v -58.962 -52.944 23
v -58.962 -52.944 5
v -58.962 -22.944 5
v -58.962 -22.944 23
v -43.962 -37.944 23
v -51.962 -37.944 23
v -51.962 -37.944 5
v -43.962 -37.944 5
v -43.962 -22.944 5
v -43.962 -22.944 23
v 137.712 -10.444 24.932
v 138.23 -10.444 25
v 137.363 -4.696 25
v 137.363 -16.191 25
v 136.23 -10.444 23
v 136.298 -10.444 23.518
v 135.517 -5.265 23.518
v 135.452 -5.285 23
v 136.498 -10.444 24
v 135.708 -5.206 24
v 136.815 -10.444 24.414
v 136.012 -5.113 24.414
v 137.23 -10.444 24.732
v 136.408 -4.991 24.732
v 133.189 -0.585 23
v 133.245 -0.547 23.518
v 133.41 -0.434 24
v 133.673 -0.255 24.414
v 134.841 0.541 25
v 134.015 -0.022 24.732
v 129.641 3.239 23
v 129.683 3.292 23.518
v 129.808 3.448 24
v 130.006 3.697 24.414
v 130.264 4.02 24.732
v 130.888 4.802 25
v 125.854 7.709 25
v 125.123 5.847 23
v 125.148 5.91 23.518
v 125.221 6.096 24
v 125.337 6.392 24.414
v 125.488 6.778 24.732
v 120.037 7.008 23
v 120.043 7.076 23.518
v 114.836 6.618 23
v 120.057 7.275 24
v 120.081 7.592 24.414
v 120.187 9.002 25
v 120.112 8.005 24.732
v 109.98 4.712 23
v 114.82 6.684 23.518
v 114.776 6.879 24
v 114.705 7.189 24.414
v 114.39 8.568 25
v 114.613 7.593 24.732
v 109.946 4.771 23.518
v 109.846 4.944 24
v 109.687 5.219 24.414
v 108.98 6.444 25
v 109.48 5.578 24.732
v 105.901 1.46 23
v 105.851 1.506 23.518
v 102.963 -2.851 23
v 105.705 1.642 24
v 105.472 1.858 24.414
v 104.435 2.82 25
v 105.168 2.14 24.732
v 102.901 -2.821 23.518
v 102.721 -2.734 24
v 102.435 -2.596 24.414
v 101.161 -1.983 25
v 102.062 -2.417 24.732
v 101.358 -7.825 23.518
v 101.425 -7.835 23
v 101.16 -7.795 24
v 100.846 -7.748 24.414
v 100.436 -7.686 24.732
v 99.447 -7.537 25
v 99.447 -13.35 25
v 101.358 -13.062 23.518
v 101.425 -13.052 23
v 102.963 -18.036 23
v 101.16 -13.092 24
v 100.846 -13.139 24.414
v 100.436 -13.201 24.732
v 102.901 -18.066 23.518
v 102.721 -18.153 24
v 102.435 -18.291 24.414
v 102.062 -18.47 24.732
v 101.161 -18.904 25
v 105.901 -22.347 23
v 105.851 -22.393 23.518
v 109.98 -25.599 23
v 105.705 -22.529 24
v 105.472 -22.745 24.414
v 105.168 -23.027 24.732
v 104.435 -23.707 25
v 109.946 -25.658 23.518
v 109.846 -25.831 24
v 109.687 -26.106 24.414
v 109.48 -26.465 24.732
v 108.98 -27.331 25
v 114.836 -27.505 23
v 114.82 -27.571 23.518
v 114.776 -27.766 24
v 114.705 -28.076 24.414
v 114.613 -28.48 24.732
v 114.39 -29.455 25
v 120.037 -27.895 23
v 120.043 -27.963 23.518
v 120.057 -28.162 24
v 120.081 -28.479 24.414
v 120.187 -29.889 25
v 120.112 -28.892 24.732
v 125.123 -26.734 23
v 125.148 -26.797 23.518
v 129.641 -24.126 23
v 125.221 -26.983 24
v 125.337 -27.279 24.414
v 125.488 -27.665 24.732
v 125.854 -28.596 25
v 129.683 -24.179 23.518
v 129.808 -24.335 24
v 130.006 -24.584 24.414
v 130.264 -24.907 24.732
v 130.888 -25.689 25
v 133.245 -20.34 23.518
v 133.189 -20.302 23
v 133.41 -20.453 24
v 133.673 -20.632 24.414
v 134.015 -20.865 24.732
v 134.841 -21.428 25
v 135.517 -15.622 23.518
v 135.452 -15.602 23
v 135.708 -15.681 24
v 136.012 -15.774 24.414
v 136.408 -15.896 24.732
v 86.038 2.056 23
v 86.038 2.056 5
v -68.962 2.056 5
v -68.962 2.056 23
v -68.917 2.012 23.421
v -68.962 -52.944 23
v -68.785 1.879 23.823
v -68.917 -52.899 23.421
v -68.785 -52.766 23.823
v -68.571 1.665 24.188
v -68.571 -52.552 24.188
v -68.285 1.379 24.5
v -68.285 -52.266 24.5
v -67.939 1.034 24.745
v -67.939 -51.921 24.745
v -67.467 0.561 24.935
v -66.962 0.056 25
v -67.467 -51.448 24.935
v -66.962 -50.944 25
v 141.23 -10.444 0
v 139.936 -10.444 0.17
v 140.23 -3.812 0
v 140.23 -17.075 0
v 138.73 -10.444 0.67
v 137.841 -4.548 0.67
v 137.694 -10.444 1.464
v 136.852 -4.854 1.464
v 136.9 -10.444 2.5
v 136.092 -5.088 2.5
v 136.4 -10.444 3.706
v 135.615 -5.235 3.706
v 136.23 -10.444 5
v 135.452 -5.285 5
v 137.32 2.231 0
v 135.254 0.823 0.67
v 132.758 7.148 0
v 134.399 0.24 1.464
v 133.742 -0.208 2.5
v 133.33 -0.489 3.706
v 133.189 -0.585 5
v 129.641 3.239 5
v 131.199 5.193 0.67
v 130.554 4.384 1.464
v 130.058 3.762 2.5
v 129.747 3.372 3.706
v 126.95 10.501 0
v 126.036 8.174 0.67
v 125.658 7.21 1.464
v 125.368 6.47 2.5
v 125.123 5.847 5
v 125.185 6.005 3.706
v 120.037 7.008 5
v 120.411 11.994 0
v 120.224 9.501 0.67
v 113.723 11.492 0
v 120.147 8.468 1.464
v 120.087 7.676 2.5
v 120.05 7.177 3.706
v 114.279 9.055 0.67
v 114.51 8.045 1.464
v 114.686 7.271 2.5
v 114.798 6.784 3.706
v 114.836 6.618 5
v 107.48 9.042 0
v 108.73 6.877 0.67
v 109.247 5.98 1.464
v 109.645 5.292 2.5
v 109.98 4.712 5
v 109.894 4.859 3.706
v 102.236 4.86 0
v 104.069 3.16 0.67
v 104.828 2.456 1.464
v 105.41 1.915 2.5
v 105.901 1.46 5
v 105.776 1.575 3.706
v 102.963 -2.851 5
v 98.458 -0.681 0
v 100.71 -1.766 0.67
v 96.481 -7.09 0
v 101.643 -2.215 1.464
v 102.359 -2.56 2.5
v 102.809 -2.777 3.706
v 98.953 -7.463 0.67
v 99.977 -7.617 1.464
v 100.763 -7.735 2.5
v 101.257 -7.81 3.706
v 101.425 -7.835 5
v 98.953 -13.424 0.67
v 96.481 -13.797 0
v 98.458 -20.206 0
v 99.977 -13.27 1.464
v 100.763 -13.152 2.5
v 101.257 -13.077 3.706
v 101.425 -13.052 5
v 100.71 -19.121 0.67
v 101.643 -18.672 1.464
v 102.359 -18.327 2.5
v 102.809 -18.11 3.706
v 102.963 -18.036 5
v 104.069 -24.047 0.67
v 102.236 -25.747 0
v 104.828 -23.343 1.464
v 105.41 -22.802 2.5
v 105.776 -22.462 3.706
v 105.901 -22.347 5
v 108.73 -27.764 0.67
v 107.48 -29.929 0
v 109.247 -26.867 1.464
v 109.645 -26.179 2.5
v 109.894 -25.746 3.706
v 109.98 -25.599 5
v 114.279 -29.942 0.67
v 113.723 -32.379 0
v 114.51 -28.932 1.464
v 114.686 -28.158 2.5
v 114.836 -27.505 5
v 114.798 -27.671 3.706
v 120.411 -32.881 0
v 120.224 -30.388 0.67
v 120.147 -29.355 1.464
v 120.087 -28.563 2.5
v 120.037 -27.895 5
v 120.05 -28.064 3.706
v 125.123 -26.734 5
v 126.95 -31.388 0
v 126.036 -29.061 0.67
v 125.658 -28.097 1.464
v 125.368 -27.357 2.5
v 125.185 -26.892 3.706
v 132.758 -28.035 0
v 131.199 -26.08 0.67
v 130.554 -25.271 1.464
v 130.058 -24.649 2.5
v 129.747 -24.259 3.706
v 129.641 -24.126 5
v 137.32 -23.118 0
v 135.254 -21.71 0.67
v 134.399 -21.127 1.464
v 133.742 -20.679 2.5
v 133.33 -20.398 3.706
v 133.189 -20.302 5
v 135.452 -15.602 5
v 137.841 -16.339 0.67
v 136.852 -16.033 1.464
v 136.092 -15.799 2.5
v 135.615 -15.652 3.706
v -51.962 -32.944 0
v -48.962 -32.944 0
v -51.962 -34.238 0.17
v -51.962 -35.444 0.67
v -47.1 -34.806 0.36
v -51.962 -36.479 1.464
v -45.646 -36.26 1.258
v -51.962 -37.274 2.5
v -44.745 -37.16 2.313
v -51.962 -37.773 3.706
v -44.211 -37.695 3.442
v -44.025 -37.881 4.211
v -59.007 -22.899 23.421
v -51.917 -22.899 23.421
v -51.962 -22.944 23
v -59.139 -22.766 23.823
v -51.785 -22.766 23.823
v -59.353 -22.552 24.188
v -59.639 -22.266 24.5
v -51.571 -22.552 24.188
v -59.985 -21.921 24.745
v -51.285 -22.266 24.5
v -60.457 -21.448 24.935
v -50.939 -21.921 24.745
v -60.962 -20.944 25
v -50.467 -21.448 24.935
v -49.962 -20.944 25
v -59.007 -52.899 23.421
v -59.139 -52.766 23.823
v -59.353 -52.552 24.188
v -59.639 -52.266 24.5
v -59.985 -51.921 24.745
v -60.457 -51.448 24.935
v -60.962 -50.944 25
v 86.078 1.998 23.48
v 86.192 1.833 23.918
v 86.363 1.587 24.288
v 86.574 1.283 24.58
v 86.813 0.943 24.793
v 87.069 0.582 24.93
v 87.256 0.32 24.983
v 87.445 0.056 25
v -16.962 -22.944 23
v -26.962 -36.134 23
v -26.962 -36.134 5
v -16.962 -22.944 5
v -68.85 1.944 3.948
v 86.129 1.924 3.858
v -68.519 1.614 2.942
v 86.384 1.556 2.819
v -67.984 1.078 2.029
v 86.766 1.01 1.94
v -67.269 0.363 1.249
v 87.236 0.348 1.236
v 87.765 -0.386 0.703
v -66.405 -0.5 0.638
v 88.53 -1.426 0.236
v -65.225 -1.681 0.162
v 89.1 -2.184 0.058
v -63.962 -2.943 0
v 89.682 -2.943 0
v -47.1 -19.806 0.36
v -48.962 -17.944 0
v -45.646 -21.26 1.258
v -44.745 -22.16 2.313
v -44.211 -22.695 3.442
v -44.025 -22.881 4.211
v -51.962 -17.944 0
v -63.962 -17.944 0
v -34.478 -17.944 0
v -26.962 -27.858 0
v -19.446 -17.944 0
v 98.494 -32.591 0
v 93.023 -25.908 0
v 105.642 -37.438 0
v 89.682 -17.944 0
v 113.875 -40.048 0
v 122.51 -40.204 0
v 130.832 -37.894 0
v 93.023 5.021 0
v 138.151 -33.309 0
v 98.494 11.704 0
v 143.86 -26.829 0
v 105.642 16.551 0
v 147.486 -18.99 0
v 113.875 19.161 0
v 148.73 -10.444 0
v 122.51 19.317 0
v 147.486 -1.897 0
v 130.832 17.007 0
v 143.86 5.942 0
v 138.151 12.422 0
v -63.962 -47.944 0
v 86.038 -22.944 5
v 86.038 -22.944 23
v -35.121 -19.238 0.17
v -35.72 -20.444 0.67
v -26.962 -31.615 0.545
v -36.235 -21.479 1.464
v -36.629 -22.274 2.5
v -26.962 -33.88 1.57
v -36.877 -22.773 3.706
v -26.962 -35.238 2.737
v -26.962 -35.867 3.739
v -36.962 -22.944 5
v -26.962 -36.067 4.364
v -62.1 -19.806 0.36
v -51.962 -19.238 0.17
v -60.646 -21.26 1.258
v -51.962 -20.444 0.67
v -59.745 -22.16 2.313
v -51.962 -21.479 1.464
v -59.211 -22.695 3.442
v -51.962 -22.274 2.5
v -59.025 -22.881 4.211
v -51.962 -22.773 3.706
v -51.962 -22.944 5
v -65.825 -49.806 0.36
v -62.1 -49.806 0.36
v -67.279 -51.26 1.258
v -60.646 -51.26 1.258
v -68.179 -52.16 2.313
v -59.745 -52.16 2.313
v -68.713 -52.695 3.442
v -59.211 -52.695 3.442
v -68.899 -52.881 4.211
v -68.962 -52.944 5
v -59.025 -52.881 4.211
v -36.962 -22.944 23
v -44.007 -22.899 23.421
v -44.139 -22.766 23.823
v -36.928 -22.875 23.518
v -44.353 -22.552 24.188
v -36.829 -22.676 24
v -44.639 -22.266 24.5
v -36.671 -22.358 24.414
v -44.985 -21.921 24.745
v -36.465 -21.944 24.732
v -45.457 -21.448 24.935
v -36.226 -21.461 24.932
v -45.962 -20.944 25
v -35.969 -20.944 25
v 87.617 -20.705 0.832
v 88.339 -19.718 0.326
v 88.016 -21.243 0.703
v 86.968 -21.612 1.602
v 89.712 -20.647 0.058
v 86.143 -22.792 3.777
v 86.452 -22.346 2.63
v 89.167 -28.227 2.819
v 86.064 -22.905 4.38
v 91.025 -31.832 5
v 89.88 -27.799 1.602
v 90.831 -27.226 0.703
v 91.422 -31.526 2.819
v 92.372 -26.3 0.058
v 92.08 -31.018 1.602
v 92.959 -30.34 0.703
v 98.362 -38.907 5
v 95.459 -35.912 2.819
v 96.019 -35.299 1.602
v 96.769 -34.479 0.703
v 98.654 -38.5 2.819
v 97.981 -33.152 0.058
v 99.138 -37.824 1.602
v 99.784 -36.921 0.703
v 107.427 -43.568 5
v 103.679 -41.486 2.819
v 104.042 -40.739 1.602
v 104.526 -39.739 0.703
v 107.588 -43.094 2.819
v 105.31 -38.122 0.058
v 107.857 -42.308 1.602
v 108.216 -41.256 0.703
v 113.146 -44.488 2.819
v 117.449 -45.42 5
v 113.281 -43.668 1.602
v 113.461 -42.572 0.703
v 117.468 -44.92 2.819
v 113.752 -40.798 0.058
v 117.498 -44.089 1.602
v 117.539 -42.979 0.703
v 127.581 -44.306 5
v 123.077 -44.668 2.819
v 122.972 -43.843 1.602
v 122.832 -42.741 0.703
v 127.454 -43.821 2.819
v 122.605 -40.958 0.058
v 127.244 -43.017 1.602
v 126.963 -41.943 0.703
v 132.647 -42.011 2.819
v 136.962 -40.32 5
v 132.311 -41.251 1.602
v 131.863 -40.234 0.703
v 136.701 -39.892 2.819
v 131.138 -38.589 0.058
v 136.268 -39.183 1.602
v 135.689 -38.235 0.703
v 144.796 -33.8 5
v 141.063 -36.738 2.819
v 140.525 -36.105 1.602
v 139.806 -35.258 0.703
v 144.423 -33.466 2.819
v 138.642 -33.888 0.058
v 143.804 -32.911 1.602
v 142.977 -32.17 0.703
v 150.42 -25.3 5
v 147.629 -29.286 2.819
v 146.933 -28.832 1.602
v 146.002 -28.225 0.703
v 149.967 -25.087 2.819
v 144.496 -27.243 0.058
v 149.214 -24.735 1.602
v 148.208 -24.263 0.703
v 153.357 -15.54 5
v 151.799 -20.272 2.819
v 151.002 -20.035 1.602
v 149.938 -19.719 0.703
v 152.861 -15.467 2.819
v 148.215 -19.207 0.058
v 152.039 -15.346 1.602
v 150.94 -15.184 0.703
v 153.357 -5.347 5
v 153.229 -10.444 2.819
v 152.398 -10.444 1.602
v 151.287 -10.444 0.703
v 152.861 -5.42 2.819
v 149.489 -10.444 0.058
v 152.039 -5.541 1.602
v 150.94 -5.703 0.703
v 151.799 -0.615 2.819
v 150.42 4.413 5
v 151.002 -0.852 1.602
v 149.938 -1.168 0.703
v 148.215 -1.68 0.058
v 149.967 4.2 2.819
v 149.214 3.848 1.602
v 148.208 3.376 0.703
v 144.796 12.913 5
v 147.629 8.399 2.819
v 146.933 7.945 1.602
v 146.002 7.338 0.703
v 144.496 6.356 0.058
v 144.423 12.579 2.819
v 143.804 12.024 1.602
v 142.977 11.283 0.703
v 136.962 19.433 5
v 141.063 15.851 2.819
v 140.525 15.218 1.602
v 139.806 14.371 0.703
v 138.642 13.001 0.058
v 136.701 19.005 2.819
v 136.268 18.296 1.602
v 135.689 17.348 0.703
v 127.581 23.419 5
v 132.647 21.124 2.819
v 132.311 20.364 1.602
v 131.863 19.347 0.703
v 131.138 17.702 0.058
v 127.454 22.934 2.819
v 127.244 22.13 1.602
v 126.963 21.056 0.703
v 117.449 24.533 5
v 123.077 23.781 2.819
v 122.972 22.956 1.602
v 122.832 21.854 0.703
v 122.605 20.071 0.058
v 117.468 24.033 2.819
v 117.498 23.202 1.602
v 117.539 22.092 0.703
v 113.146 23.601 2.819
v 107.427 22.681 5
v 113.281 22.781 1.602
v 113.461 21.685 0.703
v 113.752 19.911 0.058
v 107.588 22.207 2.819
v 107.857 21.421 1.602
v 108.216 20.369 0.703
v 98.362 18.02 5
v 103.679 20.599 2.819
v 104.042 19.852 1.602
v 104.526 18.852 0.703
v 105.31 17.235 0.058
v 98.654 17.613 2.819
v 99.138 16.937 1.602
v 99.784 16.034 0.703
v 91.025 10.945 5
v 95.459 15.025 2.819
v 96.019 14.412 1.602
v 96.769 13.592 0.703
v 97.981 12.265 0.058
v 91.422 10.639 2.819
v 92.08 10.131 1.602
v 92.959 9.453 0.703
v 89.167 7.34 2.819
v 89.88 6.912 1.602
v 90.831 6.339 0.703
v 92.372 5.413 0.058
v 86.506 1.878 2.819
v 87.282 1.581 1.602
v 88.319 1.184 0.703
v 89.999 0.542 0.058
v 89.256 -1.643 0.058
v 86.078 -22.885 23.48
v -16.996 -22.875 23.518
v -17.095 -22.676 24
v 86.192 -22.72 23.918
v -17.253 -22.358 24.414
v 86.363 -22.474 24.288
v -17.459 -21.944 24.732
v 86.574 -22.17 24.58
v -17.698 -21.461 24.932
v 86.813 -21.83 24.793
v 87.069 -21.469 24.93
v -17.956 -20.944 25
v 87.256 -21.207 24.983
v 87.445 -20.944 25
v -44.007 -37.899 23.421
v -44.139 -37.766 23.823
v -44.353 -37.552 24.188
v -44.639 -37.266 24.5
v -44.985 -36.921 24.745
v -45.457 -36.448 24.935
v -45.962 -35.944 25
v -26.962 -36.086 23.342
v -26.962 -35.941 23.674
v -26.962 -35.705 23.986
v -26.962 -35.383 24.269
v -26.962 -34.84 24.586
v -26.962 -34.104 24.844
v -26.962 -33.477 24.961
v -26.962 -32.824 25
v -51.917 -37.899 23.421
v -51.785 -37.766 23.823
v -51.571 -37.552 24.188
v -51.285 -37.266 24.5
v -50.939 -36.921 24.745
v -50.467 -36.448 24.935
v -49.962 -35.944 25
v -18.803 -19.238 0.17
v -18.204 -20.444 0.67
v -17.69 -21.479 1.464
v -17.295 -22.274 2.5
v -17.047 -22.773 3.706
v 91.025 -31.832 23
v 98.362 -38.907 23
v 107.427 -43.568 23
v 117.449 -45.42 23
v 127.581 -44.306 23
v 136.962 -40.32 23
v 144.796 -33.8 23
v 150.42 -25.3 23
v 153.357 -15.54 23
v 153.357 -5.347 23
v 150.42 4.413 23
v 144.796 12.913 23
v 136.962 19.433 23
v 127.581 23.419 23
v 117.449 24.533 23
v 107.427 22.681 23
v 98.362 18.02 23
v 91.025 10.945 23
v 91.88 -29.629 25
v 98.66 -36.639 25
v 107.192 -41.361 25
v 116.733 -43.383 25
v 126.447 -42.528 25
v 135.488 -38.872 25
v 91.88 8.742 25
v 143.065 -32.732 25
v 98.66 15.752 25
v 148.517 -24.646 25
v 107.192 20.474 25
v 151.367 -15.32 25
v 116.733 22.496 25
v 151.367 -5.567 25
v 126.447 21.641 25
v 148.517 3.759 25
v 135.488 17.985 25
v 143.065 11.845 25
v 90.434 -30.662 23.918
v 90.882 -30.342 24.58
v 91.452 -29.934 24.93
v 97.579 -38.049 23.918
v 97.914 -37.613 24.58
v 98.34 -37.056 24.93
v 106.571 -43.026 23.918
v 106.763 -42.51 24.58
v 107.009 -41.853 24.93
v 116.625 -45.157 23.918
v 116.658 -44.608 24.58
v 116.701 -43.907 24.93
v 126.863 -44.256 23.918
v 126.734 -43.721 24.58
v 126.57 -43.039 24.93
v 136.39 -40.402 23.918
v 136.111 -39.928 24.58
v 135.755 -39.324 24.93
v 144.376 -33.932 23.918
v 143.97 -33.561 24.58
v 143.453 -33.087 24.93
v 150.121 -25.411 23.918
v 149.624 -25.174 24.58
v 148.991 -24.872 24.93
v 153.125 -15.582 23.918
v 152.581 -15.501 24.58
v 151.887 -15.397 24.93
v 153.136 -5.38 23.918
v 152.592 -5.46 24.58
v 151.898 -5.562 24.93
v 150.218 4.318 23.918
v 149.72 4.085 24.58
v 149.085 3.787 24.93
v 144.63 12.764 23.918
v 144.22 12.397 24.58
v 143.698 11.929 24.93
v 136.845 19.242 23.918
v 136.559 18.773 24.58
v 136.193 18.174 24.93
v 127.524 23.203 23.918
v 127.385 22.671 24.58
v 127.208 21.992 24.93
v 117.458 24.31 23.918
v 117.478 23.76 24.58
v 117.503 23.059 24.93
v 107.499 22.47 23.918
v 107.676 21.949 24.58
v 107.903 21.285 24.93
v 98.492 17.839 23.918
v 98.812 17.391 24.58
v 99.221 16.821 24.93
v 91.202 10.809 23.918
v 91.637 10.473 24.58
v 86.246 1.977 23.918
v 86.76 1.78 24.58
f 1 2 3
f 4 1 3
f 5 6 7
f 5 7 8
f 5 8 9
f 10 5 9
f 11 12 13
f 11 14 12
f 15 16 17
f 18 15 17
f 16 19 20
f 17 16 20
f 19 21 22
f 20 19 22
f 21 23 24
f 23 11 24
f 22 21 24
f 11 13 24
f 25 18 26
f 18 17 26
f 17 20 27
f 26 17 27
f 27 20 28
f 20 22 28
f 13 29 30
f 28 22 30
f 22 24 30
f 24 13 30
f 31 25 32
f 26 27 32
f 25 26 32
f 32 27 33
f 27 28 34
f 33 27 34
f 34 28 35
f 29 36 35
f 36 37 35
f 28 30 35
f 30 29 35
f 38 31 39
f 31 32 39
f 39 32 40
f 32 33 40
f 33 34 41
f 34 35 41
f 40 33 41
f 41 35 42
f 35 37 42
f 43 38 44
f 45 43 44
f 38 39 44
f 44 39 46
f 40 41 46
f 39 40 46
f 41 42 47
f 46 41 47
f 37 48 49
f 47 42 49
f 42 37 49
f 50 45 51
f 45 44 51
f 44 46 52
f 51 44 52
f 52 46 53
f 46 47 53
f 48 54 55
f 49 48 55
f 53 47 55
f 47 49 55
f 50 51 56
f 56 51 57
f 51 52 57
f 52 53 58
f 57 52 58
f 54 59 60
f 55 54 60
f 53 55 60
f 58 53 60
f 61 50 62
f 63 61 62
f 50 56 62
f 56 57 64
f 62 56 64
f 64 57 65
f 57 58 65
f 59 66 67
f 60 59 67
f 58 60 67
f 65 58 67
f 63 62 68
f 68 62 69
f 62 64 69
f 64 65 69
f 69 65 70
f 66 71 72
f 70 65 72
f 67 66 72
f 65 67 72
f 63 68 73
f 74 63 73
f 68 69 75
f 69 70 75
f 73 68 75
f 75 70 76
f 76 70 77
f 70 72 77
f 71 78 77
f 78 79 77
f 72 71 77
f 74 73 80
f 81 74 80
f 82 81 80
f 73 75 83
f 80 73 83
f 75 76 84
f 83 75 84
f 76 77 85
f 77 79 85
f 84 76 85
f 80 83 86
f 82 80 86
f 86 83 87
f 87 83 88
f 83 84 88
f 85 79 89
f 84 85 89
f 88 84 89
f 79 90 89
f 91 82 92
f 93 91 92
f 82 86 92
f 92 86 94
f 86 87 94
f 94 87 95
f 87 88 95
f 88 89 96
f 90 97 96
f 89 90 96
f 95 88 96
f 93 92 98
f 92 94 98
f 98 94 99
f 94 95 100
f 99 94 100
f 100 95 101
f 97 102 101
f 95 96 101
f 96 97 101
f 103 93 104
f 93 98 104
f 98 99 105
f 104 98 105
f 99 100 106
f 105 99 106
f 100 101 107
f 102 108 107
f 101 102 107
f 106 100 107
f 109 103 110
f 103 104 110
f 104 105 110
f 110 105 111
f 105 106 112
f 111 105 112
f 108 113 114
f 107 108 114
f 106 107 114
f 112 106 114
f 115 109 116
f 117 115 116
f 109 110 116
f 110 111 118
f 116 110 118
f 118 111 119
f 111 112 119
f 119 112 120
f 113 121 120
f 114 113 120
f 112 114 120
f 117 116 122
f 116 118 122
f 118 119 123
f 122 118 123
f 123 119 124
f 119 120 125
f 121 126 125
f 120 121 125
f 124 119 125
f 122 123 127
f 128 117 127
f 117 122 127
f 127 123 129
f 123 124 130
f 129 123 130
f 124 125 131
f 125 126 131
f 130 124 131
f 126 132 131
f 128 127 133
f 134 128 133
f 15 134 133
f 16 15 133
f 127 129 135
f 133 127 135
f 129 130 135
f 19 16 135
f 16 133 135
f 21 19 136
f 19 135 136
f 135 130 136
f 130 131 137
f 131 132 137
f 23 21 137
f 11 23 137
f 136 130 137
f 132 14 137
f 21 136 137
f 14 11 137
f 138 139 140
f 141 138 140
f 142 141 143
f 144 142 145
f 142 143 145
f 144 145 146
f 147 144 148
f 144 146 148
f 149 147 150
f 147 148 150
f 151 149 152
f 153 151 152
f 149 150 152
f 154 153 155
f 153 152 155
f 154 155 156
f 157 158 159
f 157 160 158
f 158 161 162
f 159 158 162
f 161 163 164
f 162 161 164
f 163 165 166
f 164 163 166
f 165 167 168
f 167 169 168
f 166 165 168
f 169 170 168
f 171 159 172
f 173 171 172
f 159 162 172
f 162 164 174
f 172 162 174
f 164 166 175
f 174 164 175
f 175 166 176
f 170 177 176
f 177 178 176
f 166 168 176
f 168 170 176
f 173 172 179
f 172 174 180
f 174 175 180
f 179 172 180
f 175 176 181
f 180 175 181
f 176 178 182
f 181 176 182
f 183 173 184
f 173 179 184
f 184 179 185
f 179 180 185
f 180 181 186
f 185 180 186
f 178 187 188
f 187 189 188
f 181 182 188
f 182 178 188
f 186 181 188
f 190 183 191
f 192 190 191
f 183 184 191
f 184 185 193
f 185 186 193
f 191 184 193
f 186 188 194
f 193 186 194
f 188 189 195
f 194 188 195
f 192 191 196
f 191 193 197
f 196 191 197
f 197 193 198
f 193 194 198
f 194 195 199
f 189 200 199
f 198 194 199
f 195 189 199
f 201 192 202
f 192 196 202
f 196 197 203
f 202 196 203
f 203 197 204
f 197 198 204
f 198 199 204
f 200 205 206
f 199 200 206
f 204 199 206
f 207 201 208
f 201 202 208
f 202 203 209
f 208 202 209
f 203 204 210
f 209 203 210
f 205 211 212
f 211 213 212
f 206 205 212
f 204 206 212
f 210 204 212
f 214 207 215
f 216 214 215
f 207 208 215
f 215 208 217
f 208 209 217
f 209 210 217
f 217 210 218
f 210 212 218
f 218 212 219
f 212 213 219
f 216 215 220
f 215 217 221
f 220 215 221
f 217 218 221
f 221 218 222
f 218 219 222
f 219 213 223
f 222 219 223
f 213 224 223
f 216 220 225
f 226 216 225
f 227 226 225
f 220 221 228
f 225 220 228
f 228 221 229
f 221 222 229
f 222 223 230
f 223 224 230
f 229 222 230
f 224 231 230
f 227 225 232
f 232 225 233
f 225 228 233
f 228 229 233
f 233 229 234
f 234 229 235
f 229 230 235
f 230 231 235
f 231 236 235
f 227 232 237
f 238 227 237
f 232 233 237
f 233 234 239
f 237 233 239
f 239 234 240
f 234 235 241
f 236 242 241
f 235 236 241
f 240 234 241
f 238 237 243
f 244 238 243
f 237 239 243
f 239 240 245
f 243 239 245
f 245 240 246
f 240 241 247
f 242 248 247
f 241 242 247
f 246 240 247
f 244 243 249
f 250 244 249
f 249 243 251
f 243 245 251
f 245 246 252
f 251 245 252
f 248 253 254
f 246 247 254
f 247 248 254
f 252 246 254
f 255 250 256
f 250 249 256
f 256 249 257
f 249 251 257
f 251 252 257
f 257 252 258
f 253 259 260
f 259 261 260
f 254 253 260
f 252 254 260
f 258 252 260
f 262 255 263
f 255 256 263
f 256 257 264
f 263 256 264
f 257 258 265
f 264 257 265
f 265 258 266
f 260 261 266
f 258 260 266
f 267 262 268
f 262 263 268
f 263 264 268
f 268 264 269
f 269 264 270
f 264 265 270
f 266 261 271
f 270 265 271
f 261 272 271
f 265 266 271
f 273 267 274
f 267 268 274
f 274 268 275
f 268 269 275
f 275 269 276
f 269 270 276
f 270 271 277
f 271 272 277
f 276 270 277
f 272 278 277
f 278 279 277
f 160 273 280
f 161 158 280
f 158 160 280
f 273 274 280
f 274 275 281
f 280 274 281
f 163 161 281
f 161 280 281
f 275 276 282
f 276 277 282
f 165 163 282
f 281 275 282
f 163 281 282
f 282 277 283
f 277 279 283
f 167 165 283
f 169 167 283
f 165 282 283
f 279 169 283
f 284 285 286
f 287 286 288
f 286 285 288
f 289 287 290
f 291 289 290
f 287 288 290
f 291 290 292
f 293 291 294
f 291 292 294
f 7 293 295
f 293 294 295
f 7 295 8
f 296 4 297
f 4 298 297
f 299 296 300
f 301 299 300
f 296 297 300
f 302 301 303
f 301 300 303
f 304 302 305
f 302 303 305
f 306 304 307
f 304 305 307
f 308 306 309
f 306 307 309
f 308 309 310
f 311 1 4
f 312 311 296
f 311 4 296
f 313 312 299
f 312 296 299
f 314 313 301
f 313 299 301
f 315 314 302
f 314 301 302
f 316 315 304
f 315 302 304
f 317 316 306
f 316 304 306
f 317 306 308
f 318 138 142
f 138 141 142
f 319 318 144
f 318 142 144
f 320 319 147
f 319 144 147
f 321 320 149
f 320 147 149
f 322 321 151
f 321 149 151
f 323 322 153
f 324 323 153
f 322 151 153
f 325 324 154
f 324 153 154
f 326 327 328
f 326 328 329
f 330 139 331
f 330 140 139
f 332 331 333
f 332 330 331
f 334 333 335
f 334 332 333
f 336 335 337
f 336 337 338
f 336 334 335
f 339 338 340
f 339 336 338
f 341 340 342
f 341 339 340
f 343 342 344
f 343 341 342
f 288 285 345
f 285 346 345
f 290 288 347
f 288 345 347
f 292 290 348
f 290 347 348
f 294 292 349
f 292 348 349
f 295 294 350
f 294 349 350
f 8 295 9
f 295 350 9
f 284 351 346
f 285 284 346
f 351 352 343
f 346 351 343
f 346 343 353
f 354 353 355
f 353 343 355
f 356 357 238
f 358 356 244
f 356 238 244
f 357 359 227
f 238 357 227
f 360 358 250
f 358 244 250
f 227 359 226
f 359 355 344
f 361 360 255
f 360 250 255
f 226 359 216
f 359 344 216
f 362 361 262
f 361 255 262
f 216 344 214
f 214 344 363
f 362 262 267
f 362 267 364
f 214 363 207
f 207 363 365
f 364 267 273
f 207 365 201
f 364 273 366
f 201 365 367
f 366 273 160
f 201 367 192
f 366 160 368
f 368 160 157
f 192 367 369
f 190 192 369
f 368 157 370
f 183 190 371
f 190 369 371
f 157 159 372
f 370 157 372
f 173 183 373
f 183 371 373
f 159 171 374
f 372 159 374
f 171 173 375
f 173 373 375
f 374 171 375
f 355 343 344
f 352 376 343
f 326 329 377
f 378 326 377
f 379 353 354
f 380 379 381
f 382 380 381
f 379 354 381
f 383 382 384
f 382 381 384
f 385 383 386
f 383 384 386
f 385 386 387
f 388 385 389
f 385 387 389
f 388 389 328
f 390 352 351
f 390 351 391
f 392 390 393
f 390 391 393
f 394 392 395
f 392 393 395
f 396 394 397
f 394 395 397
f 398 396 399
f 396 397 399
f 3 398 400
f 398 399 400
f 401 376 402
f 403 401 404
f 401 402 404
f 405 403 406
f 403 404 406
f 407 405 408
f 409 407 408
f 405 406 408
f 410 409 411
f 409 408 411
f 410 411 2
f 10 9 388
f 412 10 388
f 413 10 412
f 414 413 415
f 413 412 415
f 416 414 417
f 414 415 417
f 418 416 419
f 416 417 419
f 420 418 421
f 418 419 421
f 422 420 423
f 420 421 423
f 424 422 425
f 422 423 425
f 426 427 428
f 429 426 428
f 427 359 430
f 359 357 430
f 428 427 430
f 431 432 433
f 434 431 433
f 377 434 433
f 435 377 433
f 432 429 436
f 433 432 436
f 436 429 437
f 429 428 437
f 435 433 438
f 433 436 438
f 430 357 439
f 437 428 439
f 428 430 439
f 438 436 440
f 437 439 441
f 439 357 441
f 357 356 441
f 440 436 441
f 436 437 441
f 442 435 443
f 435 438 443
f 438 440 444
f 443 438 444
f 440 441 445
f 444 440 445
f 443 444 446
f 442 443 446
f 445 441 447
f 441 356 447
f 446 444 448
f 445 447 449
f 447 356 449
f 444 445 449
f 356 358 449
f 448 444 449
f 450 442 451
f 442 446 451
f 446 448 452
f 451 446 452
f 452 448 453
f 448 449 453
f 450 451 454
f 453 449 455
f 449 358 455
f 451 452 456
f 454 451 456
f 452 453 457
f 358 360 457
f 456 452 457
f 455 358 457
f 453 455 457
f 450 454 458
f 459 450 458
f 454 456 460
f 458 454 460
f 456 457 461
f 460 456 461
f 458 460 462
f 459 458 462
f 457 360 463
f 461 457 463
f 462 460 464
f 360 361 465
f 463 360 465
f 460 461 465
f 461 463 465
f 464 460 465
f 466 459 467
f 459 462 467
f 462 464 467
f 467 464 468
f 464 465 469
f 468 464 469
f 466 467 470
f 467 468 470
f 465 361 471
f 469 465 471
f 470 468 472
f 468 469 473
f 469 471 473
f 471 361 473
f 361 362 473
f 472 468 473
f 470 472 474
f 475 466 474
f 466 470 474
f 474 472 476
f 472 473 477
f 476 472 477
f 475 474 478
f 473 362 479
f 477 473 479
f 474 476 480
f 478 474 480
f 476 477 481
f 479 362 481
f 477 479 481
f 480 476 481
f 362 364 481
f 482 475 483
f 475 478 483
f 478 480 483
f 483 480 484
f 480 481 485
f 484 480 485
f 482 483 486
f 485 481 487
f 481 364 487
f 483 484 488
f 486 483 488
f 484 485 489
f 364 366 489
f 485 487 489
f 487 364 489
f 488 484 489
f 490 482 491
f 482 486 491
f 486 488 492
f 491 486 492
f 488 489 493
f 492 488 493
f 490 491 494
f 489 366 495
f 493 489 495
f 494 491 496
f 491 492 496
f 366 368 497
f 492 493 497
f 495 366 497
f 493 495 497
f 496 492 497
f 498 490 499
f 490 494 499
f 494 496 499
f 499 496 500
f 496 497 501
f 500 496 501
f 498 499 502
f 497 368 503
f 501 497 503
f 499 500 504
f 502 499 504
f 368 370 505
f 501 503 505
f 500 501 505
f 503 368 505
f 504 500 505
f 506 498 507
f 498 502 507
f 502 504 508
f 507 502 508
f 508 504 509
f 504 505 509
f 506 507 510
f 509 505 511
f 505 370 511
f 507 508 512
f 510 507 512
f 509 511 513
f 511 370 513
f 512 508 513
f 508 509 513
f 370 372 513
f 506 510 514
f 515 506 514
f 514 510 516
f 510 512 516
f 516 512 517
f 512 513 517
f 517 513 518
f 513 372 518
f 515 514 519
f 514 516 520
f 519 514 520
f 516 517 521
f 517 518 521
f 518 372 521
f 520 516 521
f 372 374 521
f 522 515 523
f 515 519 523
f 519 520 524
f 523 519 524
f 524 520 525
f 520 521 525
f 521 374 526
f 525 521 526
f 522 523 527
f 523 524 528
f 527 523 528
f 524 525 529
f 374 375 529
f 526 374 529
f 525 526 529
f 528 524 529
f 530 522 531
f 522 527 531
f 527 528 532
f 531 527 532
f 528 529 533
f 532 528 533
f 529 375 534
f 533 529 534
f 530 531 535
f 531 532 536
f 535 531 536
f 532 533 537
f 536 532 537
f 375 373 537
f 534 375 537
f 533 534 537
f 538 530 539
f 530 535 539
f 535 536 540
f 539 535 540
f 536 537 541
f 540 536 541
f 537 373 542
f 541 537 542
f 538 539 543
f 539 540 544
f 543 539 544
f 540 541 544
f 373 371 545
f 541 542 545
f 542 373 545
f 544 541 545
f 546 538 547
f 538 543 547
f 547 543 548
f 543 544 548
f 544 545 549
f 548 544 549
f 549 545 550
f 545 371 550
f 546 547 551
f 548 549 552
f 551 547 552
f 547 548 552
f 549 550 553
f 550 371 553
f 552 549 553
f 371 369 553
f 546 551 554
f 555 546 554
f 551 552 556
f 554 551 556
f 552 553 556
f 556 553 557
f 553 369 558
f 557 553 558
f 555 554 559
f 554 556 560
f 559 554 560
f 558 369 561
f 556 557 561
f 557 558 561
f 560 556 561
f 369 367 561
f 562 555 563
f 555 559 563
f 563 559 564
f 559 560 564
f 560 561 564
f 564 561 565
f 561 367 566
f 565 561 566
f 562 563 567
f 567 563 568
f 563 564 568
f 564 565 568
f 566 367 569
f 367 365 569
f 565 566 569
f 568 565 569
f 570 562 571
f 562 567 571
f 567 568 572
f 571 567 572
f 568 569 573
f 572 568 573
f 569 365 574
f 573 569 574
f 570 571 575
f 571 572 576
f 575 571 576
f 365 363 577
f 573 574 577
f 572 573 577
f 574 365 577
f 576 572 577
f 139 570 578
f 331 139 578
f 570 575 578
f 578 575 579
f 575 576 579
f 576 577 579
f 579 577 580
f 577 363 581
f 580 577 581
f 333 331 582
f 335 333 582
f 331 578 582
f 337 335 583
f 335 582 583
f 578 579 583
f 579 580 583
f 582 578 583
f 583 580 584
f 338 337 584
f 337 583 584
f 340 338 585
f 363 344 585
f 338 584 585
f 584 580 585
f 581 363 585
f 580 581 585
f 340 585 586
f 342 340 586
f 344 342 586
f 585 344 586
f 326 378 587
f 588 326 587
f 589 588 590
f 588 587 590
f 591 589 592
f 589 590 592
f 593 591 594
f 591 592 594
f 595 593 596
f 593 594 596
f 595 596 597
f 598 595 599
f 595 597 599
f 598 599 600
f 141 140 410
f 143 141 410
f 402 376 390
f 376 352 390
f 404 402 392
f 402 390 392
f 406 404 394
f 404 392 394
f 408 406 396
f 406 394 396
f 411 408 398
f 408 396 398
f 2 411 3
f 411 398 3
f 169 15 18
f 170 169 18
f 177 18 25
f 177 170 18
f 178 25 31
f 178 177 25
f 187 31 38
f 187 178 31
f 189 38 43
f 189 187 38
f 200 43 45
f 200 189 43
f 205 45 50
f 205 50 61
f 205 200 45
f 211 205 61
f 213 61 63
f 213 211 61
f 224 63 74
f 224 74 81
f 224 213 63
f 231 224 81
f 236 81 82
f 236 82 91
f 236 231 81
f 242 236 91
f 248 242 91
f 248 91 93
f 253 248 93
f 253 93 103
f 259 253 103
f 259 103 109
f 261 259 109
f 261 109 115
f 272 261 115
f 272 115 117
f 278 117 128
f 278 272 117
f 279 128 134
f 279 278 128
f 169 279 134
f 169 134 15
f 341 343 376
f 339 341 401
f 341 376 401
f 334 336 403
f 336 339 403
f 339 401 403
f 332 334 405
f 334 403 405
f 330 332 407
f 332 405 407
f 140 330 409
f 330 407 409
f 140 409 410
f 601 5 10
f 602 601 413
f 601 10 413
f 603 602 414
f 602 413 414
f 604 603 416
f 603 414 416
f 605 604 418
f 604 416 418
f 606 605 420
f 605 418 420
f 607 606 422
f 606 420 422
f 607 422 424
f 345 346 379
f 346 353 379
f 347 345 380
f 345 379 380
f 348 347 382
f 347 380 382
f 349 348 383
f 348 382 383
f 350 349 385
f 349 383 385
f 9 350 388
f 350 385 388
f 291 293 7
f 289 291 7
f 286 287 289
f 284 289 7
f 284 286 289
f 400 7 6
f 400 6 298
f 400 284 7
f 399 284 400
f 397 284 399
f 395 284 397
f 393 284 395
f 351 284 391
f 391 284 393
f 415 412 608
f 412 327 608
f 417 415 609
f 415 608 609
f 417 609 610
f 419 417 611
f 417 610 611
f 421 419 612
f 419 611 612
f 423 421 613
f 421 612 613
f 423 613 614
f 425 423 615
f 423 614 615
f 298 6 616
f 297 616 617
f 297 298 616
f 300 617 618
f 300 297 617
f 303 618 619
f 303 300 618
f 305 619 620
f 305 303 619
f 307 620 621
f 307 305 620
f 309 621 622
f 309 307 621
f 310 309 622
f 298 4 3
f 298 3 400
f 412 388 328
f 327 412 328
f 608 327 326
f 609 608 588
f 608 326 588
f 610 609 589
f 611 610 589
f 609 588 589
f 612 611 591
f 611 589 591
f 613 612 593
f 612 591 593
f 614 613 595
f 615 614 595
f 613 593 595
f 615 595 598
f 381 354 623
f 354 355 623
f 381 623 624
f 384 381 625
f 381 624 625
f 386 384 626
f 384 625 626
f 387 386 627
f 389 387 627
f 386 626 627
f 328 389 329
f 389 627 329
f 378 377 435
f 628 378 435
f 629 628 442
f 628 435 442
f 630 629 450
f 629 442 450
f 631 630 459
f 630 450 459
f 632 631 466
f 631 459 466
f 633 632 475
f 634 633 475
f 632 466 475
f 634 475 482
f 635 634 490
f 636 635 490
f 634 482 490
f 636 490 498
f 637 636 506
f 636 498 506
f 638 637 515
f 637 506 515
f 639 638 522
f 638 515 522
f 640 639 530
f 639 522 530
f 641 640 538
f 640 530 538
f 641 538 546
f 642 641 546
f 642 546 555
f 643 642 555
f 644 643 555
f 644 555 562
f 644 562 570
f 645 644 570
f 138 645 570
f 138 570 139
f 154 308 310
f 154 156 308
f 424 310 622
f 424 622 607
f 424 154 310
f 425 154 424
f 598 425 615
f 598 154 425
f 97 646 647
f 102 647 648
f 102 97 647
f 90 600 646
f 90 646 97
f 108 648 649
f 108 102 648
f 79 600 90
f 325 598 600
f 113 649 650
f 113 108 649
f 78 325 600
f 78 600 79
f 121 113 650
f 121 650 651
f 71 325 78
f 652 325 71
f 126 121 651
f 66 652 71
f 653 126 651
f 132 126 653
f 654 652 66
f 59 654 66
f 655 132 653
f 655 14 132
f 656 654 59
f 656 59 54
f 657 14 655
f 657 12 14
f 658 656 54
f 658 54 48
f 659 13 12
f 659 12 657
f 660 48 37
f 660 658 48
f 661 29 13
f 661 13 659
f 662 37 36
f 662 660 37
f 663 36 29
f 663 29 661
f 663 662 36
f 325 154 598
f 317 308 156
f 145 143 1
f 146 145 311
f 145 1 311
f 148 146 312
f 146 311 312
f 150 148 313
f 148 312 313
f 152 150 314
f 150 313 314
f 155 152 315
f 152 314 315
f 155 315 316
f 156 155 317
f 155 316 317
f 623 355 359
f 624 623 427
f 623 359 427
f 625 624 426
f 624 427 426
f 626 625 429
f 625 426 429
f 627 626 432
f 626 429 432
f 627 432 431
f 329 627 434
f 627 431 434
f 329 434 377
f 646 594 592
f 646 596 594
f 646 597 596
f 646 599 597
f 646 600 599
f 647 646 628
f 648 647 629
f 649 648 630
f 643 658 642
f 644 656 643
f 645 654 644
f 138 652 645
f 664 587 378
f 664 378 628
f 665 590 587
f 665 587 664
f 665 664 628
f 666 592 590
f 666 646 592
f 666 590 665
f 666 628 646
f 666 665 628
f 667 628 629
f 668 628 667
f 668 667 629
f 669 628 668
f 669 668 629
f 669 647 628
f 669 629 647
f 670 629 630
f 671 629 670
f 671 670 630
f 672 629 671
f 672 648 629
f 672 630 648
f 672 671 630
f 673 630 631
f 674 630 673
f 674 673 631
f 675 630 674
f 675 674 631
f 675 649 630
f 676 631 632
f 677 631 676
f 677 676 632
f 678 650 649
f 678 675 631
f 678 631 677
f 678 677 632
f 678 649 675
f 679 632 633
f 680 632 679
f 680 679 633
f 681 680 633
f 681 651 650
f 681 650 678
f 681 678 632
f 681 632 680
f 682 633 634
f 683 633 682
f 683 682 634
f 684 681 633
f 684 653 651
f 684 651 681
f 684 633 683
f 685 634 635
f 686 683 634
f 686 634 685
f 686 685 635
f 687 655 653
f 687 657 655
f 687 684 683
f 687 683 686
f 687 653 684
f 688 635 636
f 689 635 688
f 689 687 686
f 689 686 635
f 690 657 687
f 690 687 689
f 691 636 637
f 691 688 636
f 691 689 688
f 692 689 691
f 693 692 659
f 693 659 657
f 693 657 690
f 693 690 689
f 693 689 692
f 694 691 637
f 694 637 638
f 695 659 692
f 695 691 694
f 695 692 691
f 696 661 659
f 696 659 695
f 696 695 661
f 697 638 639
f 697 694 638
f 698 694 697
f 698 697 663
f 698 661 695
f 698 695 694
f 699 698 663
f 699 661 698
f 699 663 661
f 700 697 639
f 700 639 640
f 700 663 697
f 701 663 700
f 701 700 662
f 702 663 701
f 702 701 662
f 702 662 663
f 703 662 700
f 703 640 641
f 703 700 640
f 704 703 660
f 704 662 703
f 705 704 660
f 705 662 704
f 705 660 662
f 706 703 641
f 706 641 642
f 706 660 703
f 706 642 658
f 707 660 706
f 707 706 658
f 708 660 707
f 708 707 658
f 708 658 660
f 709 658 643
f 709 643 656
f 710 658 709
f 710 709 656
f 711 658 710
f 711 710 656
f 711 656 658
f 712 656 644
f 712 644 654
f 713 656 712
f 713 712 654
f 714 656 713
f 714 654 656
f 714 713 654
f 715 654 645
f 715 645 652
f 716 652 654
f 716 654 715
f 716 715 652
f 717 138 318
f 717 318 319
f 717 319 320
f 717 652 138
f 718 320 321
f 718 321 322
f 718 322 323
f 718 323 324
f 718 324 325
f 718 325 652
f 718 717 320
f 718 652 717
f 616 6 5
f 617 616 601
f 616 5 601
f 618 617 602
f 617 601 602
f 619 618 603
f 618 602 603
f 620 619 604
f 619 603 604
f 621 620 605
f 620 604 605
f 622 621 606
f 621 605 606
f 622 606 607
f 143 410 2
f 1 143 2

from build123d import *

# Parameters (mm, degrees)
F0_R     = 17.5
F0_W     = 10
F0_H     = 30
F0_W_2   = 8
F0_H_2   = 15
F1_DEPTH = 25
F2_R     = 2
F3_R     = 4.99999


# Not quite as in the source:
# - a fillet or chamfer is up to 0.001 mm smaller than in the source, because OpenCascade refuses the exact size


with BuildPart() as f1:
    # F0 (on Top) → F1 (new body)
    with BuildSketch(Plane.XY):
        with BuildLine():
            Line((86.0379100244, 2.0564989746), (-68.9620899756, 2.0564989746))
            Line((-68.9620899756, 2.0564989746), (-68.9620899756, -22.9435010254))
            Line((-68.9620899756, -22.9435010254), (-58.9620899756, -22.9435010254))
            Line((-58.9620899756, -22.9435010254), (-51.9620899756, -22.9435010254))
            Line((-51.9620899756, -22.9435010254), (-43.9620899756, -22.9435010254))
            Line((-43.9620899756, -22.9435010254), (-36.9620899756, -22.9435010254))
            Line((-36.9620899756, -22.9435010254), (-16.9620899756, -22.9435010254))
            Line((-16.9620899756, -22.9435010254), (86.0379100244, -22.9435010254))
            ThreePointArc((86.0379100244, -22.9435010254), (153.7296521009, -10.4435010254), (86.0379100244, 2.0564989746))
        make_face()
        with Locations((118.7296521009, -10.4435010254)):
            Circle(F0_R, mode=Mode.SUBTRACT)
        with Locations((-63.9620899756, -37.9435010254)):
            Rectangle(F0_W, F0_H)
        with Locations((-47.9620899756, -30.4435010254)):
            Rectangle(F0_W_2, F0_H_2)
        Polygon((-26.9620899756, -36.1344755535), (-16.9620899756, -22.9435010254), (-36.9620899756, -22.9435010254), align=None)
    extrude(amount=F1_DEPTH)

    # F2
    f2_edges = [f1.edges().sort_by_distance(p)[0] for p in [
        (8.53791, 2.056499, 25),
        (34.53791, -22.943501, 25),
        (-21.96209, -29.538988, 25),
        (-31.96209, -29.538988, 25),
        (-40.46209, -22.943501, 25),
        (-43.96209, -30.443501, 25),
        (-47.96209, -37.943501, 25),
        (-55.46209, -22.943501, 25),
        (-51.96209, -30.443501, 25),
        (-58.96209, -37.943501, 25),
        (-63.96209, -52.943501, 25),
        (-68.96209, -25.443501, 25),
        (153.729652, -10.443501, 25),
        (101.229652, -10.443501, 25),
    ]]
    fillet(f2_edges, radius=F2_R)

    # F3 (radius 5 in the source; OpenCascade refuses exactly that, so slightly less here)
    f3_edges = [f1.edges().sort_by_distance(p)[0] for p in [
        (-21.96209, -29.538988, 0),
        (-31.96209, -29.538988, 0),
        (34.53791, -22.943501, 0),
        (8.53791, 2.056499, 0),
        (-43.96209, -30.443501, 0),
        (-47.96209, -37.943501, 0),
        (-40.46209, -22.943501, 0),
        (-55.46209, -22.943501, 0),
        (-58.96209, -37.943501, 0),
        (-68.96209, -25.443501, 0),
        (-63.96209, -52.943501, 0),
        (153.729652, -10.443501, 0),
        (101.229652, -10.443501, 0),
    ]]
    fillet(f3_edges, radius=F3_R)


solid = f1.part
